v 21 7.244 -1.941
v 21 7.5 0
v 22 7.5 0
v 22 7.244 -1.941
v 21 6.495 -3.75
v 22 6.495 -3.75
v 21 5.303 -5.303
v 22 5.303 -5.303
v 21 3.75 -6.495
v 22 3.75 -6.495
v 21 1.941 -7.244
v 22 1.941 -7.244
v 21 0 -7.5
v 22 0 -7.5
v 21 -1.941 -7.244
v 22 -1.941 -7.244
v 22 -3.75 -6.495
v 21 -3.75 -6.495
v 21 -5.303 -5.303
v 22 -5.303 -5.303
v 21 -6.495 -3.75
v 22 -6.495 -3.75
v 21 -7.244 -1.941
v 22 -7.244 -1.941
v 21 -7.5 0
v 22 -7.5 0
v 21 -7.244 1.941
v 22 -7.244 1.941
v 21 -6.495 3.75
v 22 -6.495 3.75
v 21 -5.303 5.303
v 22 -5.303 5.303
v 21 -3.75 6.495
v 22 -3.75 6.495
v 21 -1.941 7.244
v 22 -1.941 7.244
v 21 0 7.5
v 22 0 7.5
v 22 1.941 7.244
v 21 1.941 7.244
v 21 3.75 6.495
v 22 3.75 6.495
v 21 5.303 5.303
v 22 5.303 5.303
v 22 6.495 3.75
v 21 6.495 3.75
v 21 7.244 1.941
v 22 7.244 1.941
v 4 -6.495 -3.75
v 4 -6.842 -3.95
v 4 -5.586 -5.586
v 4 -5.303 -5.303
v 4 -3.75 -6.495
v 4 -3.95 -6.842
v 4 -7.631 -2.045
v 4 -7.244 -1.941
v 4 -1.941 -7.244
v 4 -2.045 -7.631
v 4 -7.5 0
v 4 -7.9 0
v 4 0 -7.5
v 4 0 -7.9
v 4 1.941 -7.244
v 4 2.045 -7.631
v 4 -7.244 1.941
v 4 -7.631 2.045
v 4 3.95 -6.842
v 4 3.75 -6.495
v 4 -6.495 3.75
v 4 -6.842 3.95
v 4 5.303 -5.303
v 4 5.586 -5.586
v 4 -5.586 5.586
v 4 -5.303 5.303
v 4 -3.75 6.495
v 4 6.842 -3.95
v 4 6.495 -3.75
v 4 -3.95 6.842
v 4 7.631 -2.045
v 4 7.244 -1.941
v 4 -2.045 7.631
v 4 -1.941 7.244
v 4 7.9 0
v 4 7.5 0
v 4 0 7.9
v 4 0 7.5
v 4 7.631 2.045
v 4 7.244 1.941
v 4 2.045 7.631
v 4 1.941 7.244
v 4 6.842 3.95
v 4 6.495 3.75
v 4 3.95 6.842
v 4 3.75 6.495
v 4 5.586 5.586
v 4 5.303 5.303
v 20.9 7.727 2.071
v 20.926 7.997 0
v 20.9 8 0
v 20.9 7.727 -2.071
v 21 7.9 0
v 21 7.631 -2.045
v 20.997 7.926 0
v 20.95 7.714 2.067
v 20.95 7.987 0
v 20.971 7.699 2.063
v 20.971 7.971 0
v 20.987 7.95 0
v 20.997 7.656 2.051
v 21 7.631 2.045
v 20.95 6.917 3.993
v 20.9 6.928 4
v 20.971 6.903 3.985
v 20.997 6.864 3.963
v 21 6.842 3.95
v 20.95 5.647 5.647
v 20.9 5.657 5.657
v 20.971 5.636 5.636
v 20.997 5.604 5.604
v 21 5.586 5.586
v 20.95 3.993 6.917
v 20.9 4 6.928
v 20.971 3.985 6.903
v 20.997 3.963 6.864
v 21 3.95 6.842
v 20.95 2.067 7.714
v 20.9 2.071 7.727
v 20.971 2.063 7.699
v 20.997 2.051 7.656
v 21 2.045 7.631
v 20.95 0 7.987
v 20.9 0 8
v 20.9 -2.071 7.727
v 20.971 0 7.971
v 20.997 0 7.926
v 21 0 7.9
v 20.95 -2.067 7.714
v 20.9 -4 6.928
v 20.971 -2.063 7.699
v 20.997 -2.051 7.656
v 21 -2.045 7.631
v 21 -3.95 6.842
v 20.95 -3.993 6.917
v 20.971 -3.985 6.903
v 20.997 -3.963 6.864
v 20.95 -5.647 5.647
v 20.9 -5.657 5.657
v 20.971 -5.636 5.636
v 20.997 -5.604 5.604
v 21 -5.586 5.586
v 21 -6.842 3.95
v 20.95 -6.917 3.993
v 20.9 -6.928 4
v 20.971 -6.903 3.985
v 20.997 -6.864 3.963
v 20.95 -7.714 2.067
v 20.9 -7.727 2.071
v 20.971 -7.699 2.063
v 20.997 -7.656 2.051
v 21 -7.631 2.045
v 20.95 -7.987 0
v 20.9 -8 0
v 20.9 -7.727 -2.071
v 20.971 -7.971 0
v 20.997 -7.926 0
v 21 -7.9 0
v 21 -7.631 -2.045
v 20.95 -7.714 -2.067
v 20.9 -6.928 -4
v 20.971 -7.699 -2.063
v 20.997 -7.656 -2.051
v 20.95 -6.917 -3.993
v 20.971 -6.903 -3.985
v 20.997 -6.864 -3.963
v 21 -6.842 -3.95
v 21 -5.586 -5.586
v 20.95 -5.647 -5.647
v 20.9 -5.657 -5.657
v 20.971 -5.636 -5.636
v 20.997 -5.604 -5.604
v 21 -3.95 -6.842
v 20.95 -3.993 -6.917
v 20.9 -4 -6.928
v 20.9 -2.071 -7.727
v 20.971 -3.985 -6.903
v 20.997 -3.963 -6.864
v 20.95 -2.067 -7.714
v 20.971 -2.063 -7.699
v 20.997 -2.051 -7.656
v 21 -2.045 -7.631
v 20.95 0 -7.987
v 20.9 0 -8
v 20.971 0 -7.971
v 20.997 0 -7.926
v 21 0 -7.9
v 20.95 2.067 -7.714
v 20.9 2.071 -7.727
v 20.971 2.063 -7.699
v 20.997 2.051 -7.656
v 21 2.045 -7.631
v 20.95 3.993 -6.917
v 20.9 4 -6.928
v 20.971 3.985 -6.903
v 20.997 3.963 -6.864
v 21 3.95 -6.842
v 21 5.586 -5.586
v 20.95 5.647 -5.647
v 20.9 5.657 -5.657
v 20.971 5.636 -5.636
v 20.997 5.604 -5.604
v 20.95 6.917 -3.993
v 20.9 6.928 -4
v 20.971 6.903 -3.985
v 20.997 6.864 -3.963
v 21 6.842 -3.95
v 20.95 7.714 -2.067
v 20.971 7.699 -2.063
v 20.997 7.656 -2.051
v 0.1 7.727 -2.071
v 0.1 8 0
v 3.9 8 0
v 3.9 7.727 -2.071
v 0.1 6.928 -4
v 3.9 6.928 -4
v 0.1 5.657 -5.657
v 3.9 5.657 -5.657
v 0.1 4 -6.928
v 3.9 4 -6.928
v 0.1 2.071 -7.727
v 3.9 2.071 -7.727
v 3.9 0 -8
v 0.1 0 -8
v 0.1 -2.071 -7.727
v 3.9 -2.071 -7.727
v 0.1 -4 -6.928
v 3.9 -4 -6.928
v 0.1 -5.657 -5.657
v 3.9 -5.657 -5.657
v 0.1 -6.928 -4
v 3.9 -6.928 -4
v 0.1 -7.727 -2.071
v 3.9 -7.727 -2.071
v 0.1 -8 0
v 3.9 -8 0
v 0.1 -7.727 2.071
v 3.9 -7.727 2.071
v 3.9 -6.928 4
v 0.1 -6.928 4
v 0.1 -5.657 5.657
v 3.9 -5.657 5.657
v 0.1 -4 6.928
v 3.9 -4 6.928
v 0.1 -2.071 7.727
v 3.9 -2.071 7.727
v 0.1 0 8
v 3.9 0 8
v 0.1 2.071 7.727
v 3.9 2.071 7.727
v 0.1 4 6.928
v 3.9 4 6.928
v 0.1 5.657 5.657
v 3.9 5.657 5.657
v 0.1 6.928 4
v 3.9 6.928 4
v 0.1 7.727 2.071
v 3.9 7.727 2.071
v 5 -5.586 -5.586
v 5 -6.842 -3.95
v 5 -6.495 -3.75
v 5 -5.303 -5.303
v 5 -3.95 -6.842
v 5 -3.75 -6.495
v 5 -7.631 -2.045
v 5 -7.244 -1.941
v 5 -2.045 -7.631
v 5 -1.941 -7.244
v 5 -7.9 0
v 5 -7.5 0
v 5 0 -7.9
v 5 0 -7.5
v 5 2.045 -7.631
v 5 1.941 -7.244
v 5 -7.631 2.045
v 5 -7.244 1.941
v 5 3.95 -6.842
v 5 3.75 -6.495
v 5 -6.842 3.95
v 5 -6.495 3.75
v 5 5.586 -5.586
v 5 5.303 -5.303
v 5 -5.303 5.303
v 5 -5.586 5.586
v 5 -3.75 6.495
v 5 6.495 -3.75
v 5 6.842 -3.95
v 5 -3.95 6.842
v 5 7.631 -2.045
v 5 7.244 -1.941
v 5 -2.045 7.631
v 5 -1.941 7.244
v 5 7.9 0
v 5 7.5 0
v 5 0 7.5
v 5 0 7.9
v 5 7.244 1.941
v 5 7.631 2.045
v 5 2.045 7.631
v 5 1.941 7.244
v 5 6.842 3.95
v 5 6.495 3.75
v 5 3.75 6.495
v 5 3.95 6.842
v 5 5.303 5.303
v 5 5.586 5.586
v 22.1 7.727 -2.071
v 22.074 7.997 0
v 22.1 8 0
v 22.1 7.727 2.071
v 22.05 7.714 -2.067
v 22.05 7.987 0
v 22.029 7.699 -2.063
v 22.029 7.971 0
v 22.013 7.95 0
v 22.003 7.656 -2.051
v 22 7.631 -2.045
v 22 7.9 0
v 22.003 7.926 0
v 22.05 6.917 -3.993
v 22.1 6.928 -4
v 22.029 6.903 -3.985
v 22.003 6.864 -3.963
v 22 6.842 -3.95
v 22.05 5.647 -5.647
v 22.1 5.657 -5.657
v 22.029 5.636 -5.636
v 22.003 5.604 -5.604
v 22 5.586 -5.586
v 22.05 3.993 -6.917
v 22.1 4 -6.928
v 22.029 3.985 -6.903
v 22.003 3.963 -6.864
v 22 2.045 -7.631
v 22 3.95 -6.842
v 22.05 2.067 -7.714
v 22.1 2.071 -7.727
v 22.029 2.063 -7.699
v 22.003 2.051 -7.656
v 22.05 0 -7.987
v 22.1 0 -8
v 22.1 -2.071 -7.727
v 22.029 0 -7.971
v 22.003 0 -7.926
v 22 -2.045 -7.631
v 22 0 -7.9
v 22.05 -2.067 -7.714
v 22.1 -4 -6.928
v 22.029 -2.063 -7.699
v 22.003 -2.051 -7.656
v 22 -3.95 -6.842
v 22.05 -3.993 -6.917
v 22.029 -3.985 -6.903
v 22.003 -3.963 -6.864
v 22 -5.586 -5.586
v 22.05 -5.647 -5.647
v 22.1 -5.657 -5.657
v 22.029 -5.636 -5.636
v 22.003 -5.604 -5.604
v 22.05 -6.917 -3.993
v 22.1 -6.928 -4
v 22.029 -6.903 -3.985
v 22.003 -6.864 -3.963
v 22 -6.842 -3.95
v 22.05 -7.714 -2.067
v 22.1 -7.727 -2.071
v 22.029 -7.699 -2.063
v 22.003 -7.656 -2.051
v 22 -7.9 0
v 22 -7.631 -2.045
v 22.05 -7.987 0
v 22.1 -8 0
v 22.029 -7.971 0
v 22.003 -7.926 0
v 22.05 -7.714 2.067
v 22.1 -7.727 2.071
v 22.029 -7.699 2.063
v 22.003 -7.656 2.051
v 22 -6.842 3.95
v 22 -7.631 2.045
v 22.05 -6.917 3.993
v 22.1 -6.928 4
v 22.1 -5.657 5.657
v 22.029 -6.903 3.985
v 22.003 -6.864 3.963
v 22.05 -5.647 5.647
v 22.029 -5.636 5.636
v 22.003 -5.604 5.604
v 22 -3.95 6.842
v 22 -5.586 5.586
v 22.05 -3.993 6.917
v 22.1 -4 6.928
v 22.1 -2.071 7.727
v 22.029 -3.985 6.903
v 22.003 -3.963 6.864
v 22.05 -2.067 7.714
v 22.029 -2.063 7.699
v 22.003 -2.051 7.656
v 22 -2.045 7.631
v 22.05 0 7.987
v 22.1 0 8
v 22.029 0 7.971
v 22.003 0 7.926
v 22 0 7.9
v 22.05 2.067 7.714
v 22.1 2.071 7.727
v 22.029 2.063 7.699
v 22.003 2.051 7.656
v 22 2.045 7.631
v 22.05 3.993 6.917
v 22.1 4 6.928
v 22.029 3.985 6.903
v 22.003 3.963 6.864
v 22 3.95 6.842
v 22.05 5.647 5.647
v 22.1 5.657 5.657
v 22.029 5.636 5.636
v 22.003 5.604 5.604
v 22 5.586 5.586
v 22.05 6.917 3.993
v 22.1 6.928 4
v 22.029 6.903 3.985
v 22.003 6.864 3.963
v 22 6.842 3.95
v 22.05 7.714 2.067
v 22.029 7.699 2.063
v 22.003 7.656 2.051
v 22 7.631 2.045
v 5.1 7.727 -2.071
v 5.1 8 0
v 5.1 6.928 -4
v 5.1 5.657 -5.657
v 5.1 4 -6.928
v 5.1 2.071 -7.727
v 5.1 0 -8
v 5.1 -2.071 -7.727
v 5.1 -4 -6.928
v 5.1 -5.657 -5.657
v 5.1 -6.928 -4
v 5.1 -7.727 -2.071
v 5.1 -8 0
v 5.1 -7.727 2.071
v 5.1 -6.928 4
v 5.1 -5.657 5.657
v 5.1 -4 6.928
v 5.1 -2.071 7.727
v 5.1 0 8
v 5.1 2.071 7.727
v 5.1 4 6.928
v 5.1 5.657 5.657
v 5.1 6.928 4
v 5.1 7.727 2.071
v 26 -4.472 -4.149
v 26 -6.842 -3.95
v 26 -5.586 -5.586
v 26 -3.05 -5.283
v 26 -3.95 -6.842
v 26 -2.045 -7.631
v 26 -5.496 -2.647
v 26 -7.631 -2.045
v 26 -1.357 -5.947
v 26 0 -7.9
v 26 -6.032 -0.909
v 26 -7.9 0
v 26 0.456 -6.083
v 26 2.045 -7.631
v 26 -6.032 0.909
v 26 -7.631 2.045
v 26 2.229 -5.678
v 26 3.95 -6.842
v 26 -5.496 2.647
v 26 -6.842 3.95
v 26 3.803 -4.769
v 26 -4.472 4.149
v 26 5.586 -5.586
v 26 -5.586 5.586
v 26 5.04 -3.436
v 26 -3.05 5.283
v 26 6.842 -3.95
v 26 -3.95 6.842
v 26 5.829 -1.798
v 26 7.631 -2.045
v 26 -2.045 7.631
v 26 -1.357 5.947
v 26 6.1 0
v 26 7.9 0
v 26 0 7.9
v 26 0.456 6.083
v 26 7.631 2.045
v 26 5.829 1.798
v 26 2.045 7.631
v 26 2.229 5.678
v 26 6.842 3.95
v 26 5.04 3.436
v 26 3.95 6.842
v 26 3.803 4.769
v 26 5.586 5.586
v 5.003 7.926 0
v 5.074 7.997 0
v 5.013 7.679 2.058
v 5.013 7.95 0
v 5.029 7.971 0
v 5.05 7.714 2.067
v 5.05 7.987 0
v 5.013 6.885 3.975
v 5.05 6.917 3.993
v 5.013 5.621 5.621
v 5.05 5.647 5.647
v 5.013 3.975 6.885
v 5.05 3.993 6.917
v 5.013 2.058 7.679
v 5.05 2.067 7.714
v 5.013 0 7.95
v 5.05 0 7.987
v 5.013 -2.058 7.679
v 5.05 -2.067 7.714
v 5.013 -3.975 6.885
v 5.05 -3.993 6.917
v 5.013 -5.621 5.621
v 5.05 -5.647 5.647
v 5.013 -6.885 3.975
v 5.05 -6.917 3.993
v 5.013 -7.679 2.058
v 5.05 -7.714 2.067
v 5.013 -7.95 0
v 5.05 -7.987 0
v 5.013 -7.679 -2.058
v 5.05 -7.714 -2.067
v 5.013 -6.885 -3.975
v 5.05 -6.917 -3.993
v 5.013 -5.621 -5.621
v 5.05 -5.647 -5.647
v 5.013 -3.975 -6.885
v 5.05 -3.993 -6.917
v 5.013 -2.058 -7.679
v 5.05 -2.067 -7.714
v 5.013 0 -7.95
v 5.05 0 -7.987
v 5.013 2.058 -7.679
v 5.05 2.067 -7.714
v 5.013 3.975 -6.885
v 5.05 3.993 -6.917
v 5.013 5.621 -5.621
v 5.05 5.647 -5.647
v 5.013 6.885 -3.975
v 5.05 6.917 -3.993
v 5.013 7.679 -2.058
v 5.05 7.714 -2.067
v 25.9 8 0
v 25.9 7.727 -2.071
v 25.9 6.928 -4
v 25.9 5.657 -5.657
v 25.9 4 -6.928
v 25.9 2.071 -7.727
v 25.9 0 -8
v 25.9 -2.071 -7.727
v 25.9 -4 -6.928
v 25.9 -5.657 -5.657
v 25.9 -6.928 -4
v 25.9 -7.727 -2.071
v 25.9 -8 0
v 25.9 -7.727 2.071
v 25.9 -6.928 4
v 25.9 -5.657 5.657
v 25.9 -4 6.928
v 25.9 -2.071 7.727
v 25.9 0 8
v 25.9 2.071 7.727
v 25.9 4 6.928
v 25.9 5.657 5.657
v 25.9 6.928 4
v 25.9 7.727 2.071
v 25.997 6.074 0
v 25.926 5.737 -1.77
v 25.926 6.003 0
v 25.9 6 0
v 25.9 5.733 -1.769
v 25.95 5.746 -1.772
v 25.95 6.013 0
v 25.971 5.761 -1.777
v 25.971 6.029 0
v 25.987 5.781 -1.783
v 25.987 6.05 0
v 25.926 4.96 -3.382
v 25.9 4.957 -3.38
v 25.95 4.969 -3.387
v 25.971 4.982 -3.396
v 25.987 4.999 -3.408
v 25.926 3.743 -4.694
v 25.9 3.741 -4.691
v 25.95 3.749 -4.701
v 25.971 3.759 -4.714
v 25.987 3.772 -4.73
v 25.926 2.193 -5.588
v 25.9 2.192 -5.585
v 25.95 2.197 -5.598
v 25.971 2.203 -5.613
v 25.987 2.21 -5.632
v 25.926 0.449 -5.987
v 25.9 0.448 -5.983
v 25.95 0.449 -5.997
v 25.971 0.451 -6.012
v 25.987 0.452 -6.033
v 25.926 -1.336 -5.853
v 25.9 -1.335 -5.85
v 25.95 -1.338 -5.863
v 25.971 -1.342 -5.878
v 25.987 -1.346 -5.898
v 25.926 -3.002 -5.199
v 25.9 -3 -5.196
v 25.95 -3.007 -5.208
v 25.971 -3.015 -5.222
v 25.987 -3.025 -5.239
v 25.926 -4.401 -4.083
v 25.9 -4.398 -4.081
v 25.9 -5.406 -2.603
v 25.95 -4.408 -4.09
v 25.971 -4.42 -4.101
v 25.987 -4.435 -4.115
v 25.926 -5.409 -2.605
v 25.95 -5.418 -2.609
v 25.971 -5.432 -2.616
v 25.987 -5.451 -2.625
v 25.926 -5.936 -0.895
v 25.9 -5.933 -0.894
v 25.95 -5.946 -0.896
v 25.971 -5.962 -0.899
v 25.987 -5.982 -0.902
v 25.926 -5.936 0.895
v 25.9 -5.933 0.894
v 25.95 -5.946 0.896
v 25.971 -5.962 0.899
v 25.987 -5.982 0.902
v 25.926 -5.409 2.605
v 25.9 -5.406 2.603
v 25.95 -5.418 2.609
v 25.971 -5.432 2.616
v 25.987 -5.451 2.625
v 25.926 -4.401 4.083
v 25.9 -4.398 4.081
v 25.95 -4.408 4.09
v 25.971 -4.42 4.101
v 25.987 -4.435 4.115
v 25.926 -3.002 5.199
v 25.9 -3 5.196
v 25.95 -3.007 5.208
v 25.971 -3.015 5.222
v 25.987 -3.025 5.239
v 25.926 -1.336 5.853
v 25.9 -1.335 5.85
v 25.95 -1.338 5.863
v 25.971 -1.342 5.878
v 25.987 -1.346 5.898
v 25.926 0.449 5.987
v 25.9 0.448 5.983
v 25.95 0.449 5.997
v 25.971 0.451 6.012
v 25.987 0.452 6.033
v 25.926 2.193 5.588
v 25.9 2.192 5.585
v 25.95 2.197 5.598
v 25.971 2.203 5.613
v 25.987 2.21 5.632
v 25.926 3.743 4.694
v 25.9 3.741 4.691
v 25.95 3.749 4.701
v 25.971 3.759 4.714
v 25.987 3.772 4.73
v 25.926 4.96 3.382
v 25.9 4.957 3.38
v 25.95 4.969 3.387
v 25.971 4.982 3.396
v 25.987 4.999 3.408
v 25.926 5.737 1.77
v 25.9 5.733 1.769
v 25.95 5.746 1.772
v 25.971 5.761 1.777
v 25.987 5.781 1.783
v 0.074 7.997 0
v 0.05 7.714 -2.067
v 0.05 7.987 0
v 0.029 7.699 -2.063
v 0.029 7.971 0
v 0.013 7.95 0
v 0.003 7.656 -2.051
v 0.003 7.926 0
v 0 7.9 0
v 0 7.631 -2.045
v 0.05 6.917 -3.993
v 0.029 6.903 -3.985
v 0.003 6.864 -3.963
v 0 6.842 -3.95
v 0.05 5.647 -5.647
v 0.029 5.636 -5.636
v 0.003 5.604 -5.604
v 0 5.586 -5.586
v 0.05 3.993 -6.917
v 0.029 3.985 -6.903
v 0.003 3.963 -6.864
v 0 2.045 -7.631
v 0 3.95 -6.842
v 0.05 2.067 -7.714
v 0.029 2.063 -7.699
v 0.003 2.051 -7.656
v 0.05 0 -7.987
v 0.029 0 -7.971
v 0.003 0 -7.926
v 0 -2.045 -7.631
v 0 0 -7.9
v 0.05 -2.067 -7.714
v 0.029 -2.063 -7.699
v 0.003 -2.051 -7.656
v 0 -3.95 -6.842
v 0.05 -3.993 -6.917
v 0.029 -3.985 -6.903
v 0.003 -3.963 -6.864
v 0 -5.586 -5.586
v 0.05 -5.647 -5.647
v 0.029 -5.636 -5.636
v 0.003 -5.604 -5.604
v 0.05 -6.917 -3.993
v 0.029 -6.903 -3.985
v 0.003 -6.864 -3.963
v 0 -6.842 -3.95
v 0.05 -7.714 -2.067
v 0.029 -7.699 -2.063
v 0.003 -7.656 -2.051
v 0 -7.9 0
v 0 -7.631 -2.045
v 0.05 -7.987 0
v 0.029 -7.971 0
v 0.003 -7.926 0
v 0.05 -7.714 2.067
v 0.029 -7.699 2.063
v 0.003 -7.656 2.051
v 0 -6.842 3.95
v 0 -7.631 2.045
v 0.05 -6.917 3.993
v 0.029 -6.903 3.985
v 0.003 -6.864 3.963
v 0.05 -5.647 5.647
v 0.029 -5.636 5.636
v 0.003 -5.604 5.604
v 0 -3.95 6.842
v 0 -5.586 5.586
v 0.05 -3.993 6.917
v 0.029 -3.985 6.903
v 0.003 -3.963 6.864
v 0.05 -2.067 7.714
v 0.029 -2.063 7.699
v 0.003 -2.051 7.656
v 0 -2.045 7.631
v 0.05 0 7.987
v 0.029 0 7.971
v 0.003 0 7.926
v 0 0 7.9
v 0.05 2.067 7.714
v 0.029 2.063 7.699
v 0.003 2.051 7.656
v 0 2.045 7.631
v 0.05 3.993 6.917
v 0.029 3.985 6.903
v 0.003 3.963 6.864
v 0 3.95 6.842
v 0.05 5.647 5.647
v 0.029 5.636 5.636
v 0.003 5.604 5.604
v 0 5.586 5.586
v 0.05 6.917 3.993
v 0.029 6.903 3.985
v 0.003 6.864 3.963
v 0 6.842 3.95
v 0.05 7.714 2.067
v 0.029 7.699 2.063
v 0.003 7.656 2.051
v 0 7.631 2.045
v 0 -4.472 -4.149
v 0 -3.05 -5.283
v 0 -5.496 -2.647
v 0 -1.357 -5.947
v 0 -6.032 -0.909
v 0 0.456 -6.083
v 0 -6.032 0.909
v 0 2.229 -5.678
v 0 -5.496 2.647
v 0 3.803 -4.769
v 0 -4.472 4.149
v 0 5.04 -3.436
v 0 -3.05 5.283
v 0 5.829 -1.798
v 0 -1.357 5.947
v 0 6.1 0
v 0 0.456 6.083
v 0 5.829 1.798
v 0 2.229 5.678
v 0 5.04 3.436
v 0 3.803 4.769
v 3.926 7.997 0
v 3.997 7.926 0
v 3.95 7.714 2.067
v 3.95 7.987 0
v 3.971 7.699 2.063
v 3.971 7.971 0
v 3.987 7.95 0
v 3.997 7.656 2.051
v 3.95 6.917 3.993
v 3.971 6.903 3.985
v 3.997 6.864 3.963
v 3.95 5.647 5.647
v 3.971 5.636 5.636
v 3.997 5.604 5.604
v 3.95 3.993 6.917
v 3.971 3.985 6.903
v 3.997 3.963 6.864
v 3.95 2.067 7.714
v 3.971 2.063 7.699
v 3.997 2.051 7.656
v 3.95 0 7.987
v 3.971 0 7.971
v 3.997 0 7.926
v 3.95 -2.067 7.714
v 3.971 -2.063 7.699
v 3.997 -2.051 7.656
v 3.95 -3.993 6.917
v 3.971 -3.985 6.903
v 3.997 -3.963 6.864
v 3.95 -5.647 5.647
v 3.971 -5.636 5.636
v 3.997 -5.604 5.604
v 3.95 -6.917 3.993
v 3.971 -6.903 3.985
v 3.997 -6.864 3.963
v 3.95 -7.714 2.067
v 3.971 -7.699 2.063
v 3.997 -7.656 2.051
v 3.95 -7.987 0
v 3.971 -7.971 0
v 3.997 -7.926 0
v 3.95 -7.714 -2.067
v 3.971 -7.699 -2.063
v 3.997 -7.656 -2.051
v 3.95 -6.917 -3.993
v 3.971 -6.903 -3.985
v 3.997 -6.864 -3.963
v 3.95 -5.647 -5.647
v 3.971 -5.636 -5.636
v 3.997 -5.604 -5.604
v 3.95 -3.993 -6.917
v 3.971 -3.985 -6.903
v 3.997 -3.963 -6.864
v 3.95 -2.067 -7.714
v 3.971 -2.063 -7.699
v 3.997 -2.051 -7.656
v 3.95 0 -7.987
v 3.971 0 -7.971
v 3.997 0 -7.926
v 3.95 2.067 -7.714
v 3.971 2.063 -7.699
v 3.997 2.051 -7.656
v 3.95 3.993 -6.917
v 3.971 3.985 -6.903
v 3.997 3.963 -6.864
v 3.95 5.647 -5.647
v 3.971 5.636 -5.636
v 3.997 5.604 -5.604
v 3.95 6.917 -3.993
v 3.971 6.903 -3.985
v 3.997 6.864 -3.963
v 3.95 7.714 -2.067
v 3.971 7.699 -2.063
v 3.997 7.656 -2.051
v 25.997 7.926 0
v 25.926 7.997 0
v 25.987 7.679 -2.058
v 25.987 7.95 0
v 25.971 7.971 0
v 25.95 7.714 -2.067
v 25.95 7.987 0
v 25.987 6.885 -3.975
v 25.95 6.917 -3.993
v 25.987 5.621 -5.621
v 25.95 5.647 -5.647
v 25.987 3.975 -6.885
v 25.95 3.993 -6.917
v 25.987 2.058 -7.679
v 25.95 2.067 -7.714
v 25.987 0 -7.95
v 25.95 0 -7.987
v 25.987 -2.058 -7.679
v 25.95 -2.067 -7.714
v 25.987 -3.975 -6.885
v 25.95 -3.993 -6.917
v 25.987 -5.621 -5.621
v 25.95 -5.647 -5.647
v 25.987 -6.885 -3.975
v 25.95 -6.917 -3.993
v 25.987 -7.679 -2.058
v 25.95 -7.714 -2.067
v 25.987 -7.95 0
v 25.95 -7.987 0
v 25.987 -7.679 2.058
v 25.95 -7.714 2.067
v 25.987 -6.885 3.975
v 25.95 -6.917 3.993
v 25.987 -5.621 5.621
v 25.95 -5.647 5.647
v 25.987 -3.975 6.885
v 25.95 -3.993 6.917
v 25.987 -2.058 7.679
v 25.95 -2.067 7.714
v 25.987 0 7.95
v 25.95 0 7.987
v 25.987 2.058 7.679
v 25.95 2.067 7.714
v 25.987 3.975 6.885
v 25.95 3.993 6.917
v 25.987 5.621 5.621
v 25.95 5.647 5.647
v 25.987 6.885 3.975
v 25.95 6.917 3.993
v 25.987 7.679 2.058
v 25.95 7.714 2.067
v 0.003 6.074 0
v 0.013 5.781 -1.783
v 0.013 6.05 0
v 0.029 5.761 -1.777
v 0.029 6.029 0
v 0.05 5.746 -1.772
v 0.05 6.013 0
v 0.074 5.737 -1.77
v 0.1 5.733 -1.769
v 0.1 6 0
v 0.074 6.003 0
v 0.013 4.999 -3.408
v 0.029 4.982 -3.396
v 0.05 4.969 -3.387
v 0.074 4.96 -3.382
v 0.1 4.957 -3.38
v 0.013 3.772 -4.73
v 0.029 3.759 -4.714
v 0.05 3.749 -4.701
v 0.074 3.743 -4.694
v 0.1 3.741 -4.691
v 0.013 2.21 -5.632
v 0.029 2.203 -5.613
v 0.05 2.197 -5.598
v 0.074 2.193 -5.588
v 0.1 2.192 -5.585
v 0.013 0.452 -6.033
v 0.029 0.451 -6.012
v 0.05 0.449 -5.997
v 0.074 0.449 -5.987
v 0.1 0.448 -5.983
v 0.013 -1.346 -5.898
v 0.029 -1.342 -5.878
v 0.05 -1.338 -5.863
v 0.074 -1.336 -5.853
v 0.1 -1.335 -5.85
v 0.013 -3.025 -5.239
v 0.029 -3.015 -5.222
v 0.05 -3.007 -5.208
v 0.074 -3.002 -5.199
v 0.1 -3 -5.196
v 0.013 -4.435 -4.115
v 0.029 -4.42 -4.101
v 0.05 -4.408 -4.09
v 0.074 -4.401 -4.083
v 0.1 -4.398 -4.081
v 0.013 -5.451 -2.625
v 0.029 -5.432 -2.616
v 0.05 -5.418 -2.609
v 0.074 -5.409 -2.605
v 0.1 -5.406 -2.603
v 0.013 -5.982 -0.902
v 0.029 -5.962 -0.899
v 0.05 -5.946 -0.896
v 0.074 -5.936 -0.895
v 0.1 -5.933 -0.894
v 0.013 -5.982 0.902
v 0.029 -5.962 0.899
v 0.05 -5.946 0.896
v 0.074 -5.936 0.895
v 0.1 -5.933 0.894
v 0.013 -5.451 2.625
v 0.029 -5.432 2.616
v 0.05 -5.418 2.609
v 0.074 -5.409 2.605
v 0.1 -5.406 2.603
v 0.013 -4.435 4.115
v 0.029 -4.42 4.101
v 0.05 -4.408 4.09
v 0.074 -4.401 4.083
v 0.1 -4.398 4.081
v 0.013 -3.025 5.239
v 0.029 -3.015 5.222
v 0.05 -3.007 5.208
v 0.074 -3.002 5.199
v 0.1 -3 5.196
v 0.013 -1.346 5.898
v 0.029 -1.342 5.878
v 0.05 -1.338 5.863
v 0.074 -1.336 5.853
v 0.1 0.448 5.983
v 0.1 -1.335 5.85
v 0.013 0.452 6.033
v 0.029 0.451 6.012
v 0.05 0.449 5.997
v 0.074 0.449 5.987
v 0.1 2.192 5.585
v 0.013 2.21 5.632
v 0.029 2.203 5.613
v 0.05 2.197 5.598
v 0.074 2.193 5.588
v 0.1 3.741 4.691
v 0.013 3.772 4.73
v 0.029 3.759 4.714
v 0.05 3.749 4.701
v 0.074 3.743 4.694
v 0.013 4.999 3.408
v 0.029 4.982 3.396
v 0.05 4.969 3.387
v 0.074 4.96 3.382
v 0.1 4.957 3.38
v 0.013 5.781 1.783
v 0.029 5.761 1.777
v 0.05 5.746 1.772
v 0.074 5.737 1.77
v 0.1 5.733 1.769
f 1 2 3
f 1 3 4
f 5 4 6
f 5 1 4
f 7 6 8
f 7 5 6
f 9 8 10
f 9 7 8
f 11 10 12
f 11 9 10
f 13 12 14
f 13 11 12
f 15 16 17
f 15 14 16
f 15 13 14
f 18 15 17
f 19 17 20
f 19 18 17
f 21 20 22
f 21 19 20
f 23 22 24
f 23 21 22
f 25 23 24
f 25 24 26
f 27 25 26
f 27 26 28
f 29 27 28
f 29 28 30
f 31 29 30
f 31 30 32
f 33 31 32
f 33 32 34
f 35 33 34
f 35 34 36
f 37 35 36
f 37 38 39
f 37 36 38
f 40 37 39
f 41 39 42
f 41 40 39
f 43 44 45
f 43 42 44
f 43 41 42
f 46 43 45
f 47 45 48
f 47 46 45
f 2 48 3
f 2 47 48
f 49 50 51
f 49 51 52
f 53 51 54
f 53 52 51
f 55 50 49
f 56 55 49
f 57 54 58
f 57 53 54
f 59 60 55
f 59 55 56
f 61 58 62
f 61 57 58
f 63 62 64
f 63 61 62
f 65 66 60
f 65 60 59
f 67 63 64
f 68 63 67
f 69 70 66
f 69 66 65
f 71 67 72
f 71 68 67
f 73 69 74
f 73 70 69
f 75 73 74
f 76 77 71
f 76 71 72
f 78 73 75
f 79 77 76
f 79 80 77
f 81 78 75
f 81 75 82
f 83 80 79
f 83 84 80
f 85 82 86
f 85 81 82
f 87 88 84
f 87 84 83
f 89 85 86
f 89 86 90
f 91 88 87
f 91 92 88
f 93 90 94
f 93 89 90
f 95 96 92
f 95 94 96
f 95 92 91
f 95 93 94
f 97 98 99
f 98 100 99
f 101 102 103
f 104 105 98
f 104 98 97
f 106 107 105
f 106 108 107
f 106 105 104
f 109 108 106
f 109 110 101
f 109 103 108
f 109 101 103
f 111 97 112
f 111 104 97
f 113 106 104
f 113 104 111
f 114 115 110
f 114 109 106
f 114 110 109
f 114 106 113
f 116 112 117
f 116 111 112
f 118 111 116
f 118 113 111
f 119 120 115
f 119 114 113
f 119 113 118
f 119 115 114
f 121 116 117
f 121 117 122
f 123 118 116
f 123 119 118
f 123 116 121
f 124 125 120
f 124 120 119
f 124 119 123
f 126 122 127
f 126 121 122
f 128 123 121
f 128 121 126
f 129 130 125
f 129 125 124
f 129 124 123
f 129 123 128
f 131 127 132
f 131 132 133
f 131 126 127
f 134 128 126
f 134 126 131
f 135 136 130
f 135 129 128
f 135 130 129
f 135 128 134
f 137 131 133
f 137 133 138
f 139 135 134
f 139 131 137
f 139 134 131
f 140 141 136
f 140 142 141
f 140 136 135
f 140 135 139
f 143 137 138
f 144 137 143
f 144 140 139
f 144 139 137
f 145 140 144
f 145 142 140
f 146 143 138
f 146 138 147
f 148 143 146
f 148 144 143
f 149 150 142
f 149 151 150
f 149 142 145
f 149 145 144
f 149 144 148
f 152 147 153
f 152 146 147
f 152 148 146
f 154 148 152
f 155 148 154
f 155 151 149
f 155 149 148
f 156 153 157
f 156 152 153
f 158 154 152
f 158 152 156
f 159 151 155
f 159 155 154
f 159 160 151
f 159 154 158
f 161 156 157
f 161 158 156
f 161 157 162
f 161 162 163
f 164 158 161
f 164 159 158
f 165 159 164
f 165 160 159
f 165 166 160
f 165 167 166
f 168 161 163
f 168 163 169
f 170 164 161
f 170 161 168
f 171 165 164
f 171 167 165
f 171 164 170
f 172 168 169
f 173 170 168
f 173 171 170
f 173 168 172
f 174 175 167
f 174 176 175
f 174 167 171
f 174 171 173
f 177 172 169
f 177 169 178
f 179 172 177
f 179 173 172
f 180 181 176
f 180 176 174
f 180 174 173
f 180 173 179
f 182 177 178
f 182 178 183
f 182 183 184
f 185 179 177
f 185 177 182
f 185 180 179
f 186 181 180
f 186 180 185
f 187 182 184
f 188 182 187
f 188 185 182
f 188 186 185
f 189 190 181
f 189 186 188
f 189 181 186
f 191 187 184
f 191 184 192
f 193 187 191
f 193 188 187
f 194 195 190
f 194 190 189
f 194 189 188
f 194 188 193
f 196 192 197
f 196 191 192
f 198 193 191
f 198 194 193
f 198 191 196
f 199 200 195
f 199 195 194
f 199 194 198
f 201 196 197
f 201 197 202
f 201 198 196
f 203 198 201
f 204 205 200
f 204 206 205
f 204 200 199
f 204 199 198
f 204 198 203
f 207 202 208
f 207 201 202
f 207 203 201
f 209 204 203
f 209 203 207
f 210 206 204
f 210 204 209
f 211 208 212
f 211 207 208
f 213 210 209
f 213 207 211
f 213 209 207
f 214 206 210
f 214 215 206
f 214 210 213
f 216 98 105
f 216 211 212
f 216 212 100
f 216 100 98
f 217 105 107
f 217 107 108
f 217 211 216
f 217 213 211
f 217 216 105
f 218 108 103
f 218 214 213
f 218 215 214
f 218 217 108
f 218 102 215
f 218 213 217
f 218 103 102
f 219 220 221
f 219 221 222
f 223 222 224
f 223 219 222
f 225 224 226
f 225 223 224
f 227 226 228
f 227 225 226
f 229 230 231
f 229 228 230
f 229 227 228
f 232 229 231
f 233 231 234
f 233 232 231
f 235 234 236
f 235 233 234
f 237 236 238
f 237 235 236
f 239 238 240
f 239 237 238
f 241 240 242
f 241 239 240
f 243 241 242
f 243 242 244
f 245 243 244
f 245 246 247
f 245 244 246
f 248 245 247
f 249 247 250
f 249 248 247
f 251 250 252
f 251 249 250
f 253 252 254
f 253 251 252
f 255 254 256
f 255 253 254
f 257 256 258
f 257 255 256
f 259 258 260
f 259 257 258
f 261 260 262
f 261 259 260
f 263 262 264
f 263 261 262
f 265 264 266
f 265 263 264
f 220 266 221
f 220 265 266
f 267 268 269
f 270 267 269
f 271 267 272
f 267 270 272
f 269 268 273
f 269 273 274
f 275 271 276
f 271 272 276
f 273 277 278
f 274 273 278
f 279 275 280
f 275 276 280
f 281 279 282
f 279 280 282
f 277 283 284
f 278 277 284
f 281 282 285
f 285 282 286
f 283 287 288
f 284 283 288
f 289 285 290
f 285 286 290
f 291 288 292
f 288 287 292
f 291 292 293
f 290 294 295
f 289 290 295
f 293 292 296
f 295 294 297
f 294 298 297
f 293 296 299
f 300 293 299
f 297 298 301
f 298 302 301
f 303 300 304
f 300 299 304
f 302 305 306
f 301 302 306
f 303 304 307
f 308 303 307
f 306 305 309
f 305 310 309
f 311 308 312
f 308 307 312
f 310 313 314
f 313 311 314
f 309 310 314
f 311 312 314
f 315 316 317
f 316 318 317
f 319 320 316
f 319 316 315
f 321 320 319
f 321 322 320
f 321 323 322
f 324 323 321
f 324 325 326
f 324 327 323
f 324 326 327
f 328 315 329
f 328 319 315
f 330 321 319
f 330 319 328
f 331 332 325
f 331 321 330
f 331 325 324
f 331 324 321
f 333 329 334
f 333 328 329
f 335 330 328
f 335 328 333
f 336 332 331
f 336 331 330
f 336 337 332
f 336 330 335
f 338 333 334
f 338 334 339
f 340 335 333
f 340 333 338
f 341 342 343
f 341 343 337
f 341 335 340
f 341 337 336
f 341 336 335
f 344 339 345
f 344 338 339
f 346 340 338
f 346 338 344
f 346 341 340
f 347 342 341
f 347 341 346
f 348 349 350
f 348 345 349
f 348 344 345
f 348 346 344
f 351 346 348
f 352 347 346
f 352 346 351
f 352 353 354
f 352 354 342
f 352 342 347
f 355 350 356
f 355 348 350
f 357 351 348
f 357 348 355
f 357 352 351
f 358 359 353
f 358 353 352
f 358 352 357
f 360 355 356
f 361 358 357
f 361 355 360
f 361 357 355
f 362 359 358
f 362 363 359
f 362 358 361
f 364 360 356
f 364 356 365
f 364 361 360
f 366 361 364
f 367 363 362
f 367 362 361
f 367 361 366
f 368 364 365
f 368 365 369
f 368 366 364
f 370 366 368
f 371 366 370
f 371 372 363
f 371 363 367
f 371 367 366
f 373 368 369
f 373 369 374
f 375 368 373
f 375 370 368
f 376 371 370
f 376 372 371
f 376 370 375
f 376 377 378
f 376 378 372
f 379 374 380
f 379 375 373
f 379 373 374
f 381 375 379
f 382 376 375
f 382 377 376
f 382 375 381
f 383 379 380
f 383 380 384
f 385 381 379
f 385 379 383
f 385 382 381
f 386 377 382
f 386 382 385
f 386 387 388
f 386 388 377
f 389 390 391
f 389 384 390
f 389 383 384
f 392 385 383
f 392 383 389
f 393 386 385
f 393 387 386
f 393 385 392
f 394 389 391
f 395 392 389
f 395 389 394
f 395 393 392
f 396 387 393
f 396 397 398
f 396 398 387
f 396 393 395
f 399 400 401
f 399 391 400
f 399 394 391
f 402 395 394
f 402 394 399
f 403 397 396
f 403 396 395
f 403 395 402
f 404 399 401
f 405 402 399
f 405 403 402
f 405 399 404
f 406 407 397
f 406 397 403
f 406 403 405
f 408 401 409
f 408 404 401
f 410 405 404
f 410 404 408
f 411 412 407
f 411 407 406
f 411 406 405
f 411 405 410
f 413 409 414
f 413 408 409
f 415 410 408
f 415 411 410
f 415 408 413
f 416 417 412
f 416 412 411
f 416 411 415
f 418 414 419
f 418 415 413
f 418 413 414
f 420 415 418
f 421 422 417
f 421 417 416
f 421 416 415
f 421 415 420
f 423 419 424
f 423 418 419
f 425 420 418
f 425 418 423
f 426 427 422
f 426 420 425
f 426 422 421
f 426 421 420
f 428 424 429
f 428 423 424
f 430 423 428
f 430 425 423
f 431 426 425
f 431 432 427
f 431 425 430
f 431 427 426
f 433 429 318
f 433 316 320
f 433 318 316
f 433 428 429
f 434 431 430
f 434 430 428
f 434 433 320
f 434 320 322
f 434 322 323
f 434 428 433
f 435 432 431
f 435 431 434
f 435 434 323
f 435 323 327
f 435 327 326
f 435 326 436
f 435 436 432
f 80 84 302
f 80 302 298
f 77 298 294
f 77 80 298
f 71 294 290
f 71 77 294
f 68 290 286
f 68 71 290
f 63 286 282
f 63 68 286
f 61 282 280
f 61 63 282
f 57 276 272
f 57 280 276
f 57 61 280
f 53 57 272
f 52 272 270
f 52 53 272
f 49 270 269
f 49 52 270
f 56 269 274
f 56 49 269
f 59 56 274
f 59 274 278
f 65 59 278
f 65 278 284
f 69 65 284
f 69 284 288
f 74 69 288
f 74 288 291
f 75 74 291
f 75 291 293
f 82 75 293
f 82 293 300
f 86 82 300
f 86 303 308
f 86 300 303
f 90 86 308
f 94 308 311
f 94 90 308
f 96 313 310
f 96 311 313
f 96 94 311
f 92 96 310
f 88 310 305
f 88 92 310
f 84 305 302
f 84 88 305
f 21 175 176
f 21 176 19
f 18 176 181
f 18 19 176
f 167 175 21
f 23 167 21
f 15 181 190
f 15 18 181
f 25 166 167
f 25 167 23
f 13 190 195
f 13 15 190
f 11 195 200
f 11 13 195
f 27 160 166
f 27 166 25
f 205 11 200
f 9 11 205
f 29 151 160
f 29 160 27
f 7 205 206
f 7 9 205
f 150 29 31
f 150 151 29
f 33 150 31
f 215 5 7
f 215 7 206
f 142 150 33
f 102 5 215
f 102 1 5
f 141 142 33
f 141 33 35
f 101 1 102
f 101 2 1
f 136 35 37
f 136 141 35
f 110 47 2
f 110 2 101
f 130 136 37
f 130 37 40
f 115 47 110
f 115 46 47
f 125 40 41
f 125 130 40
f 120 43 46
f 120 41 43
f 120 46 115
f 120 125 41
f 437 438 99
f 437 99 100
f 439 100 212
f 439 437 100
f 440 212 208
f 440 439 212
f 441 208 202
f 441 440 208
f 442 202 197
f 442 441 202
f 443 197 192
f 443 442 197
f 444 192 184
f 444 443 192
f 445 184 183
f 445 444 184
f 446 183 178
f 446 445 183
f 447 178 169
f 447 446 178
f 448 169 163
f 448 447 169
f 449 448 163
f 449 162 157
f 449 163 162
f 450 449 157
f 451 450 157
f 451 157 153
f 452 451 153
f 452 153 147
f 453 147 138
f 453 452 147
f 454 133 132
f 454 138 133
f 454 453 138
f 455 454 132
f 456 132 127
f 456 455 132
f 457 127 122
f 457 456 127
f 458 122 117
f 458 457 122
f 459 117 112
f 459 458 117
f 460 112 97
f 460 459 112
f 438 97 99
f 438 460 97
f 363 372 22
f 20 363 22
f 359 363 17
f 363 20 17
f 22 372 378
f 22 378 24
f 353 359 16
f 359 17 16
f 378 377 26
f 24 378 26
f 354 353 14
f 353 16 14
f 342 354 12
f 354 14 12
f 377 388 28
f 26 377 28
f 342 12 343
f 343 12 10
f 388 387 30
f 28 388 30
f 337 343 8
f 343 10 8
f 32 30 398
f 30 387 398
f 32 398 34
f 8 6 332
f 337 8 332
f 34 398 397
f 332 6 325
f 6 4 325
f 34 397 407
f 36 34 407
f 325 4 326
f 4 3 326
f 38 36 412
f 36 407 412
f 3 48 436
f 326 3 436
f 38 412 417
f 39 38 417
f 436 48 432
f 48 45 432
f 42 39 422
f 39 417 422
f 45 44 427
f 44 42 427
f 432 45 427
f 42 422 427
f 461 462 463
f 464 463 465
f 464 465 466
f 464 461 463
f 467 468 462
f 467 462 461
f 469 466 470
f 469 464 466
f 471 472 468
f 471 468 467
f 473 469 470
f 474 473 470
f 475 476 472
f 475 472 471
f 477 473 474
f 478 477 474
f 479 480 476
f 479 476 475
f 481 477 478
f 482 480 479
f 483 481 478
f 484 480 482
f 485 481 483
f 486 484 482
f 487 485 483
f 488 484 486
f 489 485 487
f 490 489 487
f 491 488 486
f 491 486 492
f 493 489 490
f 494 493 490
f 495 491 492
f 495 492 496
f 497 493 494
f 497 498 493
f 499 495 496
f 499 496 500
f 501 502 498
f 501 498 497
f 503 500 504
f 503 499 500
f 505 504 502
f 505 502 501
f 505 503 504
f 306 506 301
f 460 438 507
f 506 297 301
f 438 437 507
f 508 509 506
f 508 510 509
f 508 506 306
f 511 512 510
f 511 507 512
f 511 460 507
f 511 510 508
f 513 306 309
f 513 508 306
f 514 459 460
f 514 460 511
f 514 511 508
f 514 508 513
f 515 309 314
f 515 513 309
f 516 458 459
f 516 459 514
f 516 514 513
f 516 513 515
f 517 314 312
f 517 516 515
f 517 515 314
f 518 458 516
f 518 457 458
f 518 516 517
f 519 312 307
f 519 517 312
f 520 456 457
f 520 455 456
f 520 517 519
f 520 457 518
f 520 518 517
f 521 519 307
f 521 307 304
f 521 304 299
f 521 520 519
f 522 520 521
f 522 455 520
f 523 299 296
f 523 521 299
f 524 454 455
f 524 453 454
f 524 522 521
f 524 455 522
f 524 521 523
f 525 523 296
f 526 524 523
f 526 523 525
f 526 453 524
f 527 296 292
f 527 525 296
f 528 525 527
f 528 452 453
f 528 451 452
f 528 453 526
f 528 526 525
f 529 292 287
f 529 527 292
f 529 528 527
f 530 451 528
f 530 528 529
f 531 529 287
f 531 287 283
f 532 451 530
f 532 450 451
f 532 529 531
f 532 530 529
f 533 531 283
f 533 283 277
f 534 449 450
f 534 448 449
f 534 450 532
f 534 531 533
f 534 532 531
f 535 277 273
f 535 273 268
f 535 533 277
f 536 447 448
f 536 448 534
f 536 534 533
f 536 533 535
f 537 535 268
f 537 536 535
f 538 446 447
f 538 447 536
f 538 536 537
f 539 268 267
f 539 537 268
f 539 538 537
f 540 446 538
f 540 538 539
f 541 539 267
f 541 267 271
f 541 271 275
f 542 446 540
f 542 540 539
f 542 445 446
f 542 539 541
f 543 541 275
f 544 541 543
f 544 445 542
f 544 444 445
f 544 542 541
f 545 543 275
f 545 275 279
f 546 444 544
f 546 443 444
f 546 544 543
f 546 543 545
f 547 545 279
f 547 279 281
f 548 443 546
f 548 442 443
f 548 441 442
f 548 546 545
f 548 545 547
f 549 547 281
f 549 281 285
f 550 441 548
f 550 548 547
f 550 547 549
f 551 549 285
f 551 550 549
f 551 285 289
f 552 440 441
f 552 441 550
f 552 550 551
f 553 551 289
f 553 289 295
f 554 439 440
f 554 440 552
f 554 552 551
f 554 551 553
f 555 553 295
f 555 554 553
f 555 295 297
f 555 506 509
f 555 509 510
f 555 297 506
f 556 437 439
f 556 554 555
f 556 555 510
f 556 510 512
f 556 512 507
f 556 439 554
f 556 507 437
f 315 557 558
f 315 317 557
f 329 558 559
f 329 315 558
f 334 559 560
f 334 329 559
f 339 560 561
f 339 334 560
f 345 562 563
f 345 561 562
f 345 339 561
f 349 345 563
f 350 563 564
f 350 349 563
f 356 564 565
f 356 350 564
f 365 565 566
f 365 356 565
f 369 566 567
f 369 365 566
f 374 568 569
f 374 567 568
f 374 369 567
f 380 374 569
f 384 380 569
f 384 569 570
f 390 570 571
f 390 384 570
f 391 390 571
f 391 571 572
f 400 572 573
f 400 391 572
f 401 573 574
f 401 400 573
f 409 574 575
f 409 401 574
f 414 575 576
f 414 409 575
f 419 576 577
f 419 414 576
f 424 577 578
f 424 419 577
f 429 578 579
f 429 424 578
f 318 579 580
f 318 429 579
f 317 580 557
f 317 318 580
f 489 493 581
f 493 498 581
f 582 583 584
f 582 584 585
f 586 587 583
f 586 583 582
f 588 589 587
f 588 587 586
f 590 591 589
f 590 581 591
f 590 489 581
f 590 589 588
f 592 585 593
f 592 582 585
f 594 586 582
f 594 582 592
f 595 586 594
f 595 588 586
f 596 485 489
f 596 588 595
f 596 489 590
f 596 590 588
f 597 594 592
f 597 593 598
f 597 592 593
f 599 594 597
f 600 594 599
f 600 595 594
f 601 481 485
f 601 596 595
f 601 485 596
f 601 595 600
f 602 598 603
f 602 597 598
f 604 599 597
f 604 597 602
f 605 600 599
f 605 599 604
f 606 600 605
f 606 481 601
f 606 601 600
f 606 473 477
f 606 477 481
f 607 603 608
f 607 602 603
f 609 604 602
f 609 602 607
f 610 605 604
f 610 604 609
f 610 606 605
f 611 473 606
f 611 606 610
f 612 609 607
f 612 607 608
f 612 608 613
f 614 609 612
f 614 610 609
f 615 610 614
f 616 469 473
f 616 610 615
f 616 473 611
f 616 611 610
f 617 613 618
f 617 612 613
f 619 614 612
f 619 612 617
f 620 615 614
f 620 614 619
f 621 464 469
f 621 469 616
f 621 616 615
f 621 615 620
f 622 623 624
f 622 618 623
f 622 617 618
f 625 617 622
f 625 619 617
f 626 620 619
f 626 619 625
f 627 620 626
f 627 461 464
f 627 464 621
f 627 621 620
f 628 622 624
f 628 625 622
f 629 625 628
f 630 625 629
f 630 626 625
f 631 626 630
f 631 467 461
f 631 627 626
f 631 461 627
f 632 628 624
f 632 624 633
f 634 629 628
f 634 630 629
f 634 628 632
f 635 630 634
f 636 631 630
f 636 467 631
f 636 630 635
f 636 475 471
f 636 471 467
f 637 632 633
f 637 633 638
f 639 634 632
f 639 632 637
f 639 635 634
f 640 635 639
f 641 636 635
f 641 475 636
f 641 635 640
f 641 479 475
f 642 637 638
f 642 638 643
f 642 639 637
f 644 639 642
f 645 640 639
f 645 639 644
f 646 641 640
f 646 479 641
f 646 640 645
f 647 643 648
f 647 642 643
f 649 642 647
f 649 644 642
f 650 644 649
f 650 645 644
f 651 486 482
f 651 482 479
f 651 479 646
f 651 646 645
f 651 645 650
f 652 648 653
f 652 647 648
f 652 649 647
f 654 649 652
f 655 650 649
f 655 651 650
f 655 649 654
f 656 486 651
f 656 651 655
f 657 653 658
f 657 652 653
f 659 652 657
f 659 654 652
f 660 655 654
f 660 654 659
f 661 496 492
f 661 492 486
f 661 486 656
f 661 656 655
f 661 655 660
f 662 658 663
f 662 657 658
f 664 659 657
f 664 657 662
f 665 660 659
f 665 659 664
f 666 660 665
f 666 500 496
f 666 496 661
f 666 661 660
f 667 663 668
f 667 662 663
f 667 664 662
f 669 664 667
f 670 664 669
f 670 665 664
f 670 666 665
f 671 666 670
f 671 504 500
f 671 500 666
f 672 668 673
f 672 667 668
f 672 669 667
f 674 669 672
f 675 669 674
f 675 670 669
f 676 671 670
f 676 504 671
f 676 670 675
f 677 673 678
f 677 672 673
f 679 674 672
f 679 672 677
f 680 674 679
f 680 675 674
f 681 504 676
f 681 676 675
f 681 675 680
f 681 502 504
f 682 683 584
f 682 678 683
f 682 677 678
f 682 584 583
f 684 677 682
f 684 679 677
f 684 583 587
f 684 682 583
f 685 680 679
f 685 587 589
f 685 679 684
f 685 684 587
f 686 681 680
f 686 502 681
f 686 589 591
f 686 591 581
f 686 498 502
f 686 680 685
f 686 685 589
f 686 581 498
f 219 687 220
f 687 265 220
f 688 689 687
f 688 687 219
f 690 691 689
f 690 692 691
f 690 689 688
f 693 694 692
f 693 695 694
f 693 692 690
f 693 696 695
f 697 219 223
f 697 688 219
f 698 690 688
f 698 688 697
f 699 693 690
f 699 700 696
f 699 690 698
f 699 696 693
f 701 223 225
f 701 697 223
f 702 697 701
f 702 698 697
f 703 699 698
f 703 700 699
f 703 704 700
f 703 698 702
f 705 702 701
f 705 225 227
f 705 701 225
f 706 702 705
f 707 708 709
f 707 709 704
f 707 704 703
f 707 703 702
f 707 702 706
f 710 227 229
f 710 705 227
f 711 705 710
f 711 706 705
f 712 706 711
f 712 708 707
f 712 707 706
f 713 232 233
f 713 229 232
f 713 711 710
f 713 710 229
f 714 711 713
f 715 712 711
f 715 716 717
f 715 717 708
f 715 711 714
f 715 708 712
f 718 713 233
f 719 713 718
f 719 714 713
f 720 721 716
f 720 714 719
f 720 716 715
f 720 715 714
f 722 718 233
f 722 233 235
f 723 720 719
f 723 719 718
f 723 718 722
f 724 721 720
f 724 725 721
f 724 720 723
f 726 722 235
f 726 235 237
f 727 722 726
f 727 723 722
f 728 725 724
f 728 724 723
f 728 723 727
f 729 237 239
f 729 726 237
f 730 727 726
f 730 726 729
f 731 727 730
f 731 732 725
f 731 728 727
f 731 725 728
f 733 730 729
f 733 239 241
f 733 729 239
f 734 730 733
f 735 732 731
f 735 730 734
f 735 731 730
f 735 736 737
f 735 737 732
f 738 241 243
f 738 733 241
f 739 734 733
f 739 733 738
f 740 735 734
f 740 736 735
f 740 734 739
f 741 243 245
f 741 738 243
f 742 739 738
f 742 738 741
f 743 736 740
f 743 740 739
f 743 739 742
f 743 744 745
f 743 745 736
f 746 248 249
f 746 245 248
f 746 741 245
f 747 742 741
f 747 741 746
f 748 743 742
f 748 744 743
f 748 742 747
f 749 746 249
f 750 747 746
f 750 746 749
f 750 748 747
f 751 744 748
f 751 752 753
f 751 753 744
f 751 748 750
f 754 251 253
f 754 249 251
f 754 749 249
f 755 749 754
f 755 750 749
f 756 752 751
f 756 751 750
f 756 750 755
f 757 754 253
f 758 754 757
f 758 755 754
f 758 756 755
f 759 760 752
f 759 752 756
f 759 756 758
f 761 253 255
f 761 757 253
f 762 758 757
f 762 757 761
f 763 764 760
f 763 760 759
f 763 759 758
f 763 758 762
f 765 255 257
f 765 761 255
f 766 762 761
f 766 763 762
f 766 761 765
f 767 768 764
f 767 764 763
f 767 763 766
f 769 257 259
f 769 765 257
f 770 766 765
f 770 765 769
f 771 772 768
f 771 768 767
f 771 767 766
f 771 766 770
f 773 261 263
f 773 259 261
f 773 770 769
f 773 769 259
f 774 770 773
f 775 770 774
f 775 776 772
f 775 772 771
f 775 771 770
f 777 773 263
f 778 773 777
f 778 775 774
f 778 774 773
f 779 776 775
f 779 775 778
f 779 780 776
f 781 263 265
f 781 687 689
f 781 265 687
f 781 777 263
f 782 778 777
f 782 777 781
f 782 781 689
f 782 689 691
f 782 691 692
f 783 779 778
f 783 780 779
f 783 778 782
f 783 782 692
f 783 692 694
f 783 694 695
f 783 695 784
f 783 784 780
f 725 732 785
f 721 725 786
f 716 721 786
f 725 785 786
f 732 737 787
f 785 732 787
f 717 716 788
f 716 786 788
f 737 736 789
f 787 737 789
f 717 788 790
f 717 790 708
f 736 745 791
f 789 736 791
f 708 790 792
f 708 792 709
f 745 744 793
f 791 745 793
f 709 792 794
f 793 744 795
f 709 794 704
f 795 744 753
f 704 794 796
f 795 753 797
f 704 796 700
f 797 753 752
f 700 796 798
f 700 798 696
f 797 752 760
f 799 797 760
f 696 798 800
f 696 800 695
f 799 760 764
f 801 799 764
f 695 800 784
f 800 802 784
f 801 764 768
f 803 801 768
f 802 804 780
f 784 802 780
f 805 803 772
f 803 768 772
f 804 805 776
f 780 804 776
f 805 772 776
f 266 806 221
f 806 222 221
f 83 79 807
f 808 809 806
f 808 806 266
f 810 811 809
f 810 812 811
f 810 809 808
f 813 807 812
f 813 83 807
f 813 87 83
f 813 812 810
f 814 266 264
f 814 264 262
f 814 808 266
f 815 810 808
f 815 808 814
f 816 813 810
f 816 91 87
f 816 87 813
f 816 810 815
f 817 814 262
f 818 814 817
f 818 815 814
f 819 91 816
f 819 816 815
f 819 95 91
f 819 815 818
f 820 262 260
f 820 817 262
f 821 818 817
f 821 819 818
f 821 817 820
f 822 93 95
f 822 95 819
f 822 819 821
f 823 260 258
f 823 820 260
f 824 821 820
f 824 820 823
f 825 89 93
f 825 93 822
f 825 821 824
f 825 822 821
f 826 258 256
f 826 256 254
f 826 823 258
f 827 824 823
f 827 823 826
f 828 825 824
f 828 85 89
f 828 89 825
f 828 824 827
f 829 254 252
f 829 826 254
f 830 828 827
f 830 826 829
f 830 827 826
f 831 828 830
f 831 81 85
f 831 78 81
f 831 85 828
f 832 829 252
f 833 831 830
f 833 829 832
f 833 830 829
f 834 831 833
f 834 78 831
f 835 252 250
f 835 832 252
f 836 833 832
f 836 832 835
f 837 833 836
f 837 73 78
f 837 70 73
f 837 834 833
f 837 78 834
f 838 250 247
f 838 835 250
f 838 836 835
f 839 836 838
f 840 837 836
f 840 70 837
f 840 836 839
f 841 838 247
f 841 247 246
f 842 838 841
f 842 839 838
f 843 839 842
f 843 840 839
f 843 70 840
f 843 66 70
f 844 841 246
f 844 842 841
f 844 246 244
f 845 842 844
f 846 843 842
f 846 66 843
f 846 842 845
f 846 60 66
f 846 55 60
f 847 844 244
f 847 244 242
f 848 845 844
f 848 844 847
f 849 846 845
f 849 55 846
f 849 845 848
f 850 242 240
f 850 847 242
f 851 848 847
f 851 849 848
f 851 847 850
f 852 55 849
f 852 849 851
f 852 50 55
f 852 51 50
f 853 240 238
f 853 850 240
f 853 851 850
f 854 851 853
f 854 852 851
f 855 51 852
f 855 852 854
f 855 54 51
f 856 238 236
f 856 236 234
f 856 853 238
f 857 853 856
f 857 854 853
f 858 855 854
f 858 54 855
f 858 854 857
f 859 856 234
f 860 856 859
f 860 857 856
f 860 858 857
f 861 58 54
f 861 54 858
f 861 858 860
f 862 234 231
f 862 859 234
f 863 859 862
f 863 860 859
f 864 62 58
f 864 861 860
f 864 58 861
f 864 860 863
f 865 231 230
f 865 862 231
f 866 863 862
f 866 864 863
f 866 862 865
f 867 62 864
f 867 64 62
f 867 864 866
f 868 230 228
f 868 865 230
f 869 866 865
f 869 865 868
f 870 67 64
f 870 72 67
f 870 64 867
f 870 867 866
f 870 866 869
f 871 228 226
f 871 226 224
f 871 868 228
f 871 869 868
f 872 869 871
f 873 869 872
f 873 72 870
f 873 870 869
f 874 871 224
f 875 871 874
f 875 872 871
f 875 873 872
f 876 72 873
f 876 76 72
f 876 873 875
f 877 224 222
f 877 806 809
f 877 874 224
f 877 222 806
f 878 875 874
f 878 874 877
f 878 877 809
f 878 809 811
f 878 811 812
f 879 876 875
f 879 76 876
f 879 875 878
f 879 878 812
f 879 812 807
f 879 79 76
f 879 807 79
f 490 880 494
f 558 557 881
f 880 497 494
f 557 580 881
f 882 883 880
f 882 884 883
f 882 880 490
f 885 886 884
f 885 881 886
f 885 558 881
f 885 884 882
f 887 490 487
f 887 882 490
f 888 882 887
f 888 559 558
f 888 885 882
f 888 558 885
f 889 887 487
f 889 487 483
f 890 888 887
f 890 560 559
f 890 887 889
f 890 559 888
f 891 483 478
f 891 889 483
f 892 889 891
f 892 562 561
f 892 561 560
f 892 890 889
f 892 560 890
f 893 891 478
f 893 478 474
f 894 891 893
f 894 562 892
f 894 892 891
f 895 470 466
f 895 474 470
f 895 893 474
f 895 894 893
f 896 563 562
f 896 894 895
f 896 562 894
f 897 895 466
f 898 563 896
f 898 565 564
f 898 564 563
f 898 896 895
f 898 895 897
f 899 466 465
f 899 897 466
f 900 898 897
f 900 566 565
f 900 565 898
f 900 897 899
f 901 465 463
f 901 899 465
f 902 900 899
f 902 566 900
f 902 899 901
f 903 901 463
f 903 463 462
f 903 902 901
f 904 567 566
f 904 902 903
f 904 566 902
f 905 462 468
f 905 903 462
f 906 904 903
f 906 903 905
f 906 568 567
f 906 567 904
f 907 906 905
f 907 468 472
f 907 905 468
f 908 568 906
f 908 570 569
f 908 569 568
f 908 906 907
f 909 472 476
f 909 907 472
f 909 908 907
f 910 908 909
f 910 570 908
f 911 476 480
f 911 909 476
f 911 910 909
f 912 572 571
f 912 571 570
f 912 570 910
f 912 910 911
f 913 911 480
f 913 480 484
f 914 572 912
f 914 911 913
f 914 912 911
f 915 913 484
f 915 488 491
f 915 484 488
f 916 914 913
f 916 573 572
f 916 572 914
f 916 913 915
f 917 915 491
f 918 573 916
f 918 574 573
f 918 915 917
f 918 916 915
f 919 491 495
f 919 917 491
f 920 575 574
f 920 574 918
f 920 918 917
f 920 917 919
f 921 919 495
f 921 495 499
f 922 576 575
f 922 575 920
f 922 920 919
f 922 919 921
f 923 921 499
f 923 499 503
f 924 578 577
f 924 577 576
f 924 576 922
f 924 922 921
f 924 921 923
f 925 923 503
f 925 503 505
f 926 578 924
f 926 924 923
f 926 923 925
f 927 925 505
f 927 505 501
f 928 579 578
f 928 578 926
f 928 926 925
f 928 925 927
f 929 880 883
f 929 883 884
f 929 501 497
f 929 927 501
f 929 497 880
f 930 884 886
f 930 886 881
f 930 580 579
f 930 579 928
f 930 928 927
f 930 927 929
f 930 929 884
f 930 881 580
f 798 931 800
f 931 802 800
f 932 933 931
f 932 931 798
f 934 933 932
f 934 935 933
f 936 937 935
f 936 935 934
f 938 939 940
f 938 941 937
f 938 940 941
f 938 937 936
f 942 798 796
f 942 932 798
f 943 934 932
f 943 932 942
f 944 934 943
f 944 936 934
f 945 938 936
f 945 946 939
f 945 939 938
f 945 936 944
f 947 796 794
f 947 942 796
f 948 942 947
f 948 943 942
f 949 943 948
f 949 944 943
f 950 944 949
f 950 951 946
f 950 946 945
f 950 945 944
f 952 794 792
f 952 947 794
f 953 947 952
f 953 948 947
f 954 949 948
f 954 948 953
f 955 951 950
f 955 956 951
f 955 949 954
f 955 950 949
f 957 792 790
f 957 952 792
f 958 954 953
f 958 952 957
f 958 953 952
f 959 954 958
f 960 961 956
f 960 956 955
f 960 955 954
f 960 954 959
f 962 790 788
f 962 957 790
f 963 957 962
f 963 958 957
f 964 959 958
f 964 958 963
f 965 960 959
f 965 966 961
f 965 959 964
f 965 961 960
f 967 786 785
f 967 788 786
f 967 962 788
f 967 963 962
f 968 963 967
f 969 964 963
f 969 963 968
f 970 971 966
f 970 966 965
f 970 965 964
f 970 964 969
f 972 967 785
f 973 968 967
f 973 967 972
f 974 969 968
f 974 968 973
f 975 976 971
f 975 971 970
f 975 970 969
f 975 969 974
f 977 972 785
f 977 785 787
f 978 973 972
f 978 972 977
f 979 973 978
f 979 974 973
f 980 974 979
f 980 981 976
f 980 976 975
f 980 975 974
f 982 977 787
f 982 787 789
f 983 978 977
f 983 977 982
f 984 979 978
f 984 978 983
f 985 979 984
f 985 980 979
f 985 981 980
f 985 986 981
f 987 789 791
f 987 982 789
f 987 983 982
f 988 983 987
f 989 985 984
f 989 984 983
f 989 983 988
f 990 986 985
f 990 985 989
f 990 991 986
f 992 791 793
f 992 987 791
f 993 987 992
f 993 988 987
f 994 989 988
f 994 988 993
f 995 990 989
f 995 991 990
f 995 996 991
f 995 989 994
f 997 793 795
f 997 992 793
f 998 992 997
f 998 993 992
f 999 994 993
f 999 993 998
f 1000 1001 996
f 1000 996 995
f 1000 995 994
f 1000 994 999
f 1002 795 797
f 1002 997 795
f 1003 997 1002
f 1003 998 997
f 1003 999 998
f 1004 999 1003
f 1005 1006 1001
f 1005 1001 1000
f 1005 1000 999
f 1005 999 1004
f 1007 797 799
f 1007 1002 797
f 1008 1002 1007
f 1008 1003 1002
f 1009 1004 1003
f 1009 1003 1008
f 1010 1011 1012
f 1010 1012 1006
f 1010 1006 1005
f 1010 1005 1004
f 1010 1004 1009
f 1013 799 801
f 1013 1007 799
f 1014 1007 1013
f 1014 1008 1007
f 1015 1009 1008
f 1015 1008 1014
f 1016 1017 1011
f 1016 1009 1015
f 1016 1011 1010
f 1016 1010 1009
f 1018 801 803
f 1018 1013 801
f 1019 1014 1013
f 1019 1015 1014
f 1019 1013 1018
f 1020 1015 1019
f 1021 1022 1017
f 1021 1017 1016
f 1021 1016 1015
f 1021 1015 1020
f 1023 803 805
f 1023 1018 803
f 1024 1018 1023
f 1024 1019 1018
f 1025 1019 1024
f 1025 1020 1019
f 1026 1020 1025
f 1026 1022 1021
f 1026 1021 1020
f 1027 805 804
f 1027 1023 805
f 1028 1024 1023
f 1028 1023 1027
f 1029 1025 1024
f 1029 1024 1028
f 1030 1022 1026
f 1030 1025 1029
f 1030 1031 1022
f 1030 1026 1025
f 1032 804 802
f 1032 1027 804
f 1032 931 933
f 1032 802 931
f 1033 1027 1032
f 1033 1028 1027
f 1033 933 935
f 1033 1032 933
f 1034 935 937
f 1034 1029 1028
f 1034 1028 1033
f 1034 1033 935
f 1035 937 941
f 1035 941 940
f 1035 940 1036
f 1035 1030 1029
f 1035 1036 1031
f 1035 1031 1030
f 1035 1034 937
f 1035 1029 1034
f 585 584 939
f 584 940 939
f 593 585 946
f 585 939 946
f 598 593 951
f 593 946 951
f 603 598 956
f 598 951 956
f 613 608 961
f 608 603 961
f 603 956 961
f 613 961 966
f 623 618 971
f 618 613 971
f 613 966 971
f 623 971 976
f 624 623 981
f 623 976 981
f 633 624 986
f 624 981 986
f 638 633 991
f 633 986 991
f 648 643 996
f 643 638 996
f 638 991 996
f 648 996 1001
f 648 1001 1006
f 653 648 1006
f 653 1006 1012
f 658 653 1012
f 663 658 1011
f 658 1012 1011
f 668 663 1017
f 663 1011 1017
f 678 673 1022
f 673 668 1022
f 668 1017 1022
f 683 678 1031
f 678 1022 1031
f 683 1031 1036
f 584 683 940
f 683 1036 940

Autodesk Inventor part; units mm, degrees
ref_plane "YZ Plane" through (0, 0, 0) normal (1, 0, 0) x (0, 1, 0)
ref_plane "XZ Plane" through (0, 0, 0) normal (0, 1, 0) x (-1, 0, 0)
ref_plane "XY Plane" through (0, 0, 0) normal (0, 0, 1) x (1, 0, 0)
sketch "Szkic1" plane through (0, 0, 0) normal (1, 0, 0) x (0, 1, 0)
  circle A0 centre (0, 0) radius 8
  circle A1 centre (0, 0) radius 6
  dimension "d0" = 16
  dimension "d1" = 12
extrude "Wyciągnięcie proste1" add sketch "Szkic1" along normal blind 26
sketch "Szkic2" plane through (0, 0, 0) normal (0, 0, 1) x (1, 0, 0)
  line L0 (4, 8) -> (5, 8)
  line L1 (5, 8) -> (5, 7.5)
  line L2 (5, 7.5) -> (4, 7.5)
  line L3 (4, 7.5) -> (4, 8)
  line L4 (21, 8) -> (22, 8)
  line L5 (22, 8) -> (22, 7.5)
  line L6 (22, 7.5) -> (21, 7.5)
  line L7 (21, 7.5) -> (21, 8)
  line L8 (26, -8) -> (26, 8) projected
  line L9 (0, -8) -> (0, 8) projected
  line L10 (0, 8) -> (26, 8) projected
  line L11 (-5.2, 0) -> (31.2, 0) projected
  point P0 (0, 0)
  point P1 (4.5, 8)
  point P2 (21.5, 8)
  dimension "d4" = 1
  dimension "d5" = 0.5
  dimension "d6" = 1
  dimension "d7" = 0.5
  dimension "d8" = 4
  dimension "d9" = 4
revolve "Obrót1" cut sketch "Szkic2" angle 360 about axis through (-10, 0, 0) along (1, 0, 0) contours L0 L1 L2 L3 | L4 L5 L6 L7
fillet "Zaokrąglenie1" radius 0.1 8 edges at (26, -8, 0) (26, -6, 0) (0, -8, 0) (0, -6, 0) (4, -8, 0) (5, -8, 0) (21, -8, 0) (22, -8, 0)
properties part number "SC8 bearing ext"
